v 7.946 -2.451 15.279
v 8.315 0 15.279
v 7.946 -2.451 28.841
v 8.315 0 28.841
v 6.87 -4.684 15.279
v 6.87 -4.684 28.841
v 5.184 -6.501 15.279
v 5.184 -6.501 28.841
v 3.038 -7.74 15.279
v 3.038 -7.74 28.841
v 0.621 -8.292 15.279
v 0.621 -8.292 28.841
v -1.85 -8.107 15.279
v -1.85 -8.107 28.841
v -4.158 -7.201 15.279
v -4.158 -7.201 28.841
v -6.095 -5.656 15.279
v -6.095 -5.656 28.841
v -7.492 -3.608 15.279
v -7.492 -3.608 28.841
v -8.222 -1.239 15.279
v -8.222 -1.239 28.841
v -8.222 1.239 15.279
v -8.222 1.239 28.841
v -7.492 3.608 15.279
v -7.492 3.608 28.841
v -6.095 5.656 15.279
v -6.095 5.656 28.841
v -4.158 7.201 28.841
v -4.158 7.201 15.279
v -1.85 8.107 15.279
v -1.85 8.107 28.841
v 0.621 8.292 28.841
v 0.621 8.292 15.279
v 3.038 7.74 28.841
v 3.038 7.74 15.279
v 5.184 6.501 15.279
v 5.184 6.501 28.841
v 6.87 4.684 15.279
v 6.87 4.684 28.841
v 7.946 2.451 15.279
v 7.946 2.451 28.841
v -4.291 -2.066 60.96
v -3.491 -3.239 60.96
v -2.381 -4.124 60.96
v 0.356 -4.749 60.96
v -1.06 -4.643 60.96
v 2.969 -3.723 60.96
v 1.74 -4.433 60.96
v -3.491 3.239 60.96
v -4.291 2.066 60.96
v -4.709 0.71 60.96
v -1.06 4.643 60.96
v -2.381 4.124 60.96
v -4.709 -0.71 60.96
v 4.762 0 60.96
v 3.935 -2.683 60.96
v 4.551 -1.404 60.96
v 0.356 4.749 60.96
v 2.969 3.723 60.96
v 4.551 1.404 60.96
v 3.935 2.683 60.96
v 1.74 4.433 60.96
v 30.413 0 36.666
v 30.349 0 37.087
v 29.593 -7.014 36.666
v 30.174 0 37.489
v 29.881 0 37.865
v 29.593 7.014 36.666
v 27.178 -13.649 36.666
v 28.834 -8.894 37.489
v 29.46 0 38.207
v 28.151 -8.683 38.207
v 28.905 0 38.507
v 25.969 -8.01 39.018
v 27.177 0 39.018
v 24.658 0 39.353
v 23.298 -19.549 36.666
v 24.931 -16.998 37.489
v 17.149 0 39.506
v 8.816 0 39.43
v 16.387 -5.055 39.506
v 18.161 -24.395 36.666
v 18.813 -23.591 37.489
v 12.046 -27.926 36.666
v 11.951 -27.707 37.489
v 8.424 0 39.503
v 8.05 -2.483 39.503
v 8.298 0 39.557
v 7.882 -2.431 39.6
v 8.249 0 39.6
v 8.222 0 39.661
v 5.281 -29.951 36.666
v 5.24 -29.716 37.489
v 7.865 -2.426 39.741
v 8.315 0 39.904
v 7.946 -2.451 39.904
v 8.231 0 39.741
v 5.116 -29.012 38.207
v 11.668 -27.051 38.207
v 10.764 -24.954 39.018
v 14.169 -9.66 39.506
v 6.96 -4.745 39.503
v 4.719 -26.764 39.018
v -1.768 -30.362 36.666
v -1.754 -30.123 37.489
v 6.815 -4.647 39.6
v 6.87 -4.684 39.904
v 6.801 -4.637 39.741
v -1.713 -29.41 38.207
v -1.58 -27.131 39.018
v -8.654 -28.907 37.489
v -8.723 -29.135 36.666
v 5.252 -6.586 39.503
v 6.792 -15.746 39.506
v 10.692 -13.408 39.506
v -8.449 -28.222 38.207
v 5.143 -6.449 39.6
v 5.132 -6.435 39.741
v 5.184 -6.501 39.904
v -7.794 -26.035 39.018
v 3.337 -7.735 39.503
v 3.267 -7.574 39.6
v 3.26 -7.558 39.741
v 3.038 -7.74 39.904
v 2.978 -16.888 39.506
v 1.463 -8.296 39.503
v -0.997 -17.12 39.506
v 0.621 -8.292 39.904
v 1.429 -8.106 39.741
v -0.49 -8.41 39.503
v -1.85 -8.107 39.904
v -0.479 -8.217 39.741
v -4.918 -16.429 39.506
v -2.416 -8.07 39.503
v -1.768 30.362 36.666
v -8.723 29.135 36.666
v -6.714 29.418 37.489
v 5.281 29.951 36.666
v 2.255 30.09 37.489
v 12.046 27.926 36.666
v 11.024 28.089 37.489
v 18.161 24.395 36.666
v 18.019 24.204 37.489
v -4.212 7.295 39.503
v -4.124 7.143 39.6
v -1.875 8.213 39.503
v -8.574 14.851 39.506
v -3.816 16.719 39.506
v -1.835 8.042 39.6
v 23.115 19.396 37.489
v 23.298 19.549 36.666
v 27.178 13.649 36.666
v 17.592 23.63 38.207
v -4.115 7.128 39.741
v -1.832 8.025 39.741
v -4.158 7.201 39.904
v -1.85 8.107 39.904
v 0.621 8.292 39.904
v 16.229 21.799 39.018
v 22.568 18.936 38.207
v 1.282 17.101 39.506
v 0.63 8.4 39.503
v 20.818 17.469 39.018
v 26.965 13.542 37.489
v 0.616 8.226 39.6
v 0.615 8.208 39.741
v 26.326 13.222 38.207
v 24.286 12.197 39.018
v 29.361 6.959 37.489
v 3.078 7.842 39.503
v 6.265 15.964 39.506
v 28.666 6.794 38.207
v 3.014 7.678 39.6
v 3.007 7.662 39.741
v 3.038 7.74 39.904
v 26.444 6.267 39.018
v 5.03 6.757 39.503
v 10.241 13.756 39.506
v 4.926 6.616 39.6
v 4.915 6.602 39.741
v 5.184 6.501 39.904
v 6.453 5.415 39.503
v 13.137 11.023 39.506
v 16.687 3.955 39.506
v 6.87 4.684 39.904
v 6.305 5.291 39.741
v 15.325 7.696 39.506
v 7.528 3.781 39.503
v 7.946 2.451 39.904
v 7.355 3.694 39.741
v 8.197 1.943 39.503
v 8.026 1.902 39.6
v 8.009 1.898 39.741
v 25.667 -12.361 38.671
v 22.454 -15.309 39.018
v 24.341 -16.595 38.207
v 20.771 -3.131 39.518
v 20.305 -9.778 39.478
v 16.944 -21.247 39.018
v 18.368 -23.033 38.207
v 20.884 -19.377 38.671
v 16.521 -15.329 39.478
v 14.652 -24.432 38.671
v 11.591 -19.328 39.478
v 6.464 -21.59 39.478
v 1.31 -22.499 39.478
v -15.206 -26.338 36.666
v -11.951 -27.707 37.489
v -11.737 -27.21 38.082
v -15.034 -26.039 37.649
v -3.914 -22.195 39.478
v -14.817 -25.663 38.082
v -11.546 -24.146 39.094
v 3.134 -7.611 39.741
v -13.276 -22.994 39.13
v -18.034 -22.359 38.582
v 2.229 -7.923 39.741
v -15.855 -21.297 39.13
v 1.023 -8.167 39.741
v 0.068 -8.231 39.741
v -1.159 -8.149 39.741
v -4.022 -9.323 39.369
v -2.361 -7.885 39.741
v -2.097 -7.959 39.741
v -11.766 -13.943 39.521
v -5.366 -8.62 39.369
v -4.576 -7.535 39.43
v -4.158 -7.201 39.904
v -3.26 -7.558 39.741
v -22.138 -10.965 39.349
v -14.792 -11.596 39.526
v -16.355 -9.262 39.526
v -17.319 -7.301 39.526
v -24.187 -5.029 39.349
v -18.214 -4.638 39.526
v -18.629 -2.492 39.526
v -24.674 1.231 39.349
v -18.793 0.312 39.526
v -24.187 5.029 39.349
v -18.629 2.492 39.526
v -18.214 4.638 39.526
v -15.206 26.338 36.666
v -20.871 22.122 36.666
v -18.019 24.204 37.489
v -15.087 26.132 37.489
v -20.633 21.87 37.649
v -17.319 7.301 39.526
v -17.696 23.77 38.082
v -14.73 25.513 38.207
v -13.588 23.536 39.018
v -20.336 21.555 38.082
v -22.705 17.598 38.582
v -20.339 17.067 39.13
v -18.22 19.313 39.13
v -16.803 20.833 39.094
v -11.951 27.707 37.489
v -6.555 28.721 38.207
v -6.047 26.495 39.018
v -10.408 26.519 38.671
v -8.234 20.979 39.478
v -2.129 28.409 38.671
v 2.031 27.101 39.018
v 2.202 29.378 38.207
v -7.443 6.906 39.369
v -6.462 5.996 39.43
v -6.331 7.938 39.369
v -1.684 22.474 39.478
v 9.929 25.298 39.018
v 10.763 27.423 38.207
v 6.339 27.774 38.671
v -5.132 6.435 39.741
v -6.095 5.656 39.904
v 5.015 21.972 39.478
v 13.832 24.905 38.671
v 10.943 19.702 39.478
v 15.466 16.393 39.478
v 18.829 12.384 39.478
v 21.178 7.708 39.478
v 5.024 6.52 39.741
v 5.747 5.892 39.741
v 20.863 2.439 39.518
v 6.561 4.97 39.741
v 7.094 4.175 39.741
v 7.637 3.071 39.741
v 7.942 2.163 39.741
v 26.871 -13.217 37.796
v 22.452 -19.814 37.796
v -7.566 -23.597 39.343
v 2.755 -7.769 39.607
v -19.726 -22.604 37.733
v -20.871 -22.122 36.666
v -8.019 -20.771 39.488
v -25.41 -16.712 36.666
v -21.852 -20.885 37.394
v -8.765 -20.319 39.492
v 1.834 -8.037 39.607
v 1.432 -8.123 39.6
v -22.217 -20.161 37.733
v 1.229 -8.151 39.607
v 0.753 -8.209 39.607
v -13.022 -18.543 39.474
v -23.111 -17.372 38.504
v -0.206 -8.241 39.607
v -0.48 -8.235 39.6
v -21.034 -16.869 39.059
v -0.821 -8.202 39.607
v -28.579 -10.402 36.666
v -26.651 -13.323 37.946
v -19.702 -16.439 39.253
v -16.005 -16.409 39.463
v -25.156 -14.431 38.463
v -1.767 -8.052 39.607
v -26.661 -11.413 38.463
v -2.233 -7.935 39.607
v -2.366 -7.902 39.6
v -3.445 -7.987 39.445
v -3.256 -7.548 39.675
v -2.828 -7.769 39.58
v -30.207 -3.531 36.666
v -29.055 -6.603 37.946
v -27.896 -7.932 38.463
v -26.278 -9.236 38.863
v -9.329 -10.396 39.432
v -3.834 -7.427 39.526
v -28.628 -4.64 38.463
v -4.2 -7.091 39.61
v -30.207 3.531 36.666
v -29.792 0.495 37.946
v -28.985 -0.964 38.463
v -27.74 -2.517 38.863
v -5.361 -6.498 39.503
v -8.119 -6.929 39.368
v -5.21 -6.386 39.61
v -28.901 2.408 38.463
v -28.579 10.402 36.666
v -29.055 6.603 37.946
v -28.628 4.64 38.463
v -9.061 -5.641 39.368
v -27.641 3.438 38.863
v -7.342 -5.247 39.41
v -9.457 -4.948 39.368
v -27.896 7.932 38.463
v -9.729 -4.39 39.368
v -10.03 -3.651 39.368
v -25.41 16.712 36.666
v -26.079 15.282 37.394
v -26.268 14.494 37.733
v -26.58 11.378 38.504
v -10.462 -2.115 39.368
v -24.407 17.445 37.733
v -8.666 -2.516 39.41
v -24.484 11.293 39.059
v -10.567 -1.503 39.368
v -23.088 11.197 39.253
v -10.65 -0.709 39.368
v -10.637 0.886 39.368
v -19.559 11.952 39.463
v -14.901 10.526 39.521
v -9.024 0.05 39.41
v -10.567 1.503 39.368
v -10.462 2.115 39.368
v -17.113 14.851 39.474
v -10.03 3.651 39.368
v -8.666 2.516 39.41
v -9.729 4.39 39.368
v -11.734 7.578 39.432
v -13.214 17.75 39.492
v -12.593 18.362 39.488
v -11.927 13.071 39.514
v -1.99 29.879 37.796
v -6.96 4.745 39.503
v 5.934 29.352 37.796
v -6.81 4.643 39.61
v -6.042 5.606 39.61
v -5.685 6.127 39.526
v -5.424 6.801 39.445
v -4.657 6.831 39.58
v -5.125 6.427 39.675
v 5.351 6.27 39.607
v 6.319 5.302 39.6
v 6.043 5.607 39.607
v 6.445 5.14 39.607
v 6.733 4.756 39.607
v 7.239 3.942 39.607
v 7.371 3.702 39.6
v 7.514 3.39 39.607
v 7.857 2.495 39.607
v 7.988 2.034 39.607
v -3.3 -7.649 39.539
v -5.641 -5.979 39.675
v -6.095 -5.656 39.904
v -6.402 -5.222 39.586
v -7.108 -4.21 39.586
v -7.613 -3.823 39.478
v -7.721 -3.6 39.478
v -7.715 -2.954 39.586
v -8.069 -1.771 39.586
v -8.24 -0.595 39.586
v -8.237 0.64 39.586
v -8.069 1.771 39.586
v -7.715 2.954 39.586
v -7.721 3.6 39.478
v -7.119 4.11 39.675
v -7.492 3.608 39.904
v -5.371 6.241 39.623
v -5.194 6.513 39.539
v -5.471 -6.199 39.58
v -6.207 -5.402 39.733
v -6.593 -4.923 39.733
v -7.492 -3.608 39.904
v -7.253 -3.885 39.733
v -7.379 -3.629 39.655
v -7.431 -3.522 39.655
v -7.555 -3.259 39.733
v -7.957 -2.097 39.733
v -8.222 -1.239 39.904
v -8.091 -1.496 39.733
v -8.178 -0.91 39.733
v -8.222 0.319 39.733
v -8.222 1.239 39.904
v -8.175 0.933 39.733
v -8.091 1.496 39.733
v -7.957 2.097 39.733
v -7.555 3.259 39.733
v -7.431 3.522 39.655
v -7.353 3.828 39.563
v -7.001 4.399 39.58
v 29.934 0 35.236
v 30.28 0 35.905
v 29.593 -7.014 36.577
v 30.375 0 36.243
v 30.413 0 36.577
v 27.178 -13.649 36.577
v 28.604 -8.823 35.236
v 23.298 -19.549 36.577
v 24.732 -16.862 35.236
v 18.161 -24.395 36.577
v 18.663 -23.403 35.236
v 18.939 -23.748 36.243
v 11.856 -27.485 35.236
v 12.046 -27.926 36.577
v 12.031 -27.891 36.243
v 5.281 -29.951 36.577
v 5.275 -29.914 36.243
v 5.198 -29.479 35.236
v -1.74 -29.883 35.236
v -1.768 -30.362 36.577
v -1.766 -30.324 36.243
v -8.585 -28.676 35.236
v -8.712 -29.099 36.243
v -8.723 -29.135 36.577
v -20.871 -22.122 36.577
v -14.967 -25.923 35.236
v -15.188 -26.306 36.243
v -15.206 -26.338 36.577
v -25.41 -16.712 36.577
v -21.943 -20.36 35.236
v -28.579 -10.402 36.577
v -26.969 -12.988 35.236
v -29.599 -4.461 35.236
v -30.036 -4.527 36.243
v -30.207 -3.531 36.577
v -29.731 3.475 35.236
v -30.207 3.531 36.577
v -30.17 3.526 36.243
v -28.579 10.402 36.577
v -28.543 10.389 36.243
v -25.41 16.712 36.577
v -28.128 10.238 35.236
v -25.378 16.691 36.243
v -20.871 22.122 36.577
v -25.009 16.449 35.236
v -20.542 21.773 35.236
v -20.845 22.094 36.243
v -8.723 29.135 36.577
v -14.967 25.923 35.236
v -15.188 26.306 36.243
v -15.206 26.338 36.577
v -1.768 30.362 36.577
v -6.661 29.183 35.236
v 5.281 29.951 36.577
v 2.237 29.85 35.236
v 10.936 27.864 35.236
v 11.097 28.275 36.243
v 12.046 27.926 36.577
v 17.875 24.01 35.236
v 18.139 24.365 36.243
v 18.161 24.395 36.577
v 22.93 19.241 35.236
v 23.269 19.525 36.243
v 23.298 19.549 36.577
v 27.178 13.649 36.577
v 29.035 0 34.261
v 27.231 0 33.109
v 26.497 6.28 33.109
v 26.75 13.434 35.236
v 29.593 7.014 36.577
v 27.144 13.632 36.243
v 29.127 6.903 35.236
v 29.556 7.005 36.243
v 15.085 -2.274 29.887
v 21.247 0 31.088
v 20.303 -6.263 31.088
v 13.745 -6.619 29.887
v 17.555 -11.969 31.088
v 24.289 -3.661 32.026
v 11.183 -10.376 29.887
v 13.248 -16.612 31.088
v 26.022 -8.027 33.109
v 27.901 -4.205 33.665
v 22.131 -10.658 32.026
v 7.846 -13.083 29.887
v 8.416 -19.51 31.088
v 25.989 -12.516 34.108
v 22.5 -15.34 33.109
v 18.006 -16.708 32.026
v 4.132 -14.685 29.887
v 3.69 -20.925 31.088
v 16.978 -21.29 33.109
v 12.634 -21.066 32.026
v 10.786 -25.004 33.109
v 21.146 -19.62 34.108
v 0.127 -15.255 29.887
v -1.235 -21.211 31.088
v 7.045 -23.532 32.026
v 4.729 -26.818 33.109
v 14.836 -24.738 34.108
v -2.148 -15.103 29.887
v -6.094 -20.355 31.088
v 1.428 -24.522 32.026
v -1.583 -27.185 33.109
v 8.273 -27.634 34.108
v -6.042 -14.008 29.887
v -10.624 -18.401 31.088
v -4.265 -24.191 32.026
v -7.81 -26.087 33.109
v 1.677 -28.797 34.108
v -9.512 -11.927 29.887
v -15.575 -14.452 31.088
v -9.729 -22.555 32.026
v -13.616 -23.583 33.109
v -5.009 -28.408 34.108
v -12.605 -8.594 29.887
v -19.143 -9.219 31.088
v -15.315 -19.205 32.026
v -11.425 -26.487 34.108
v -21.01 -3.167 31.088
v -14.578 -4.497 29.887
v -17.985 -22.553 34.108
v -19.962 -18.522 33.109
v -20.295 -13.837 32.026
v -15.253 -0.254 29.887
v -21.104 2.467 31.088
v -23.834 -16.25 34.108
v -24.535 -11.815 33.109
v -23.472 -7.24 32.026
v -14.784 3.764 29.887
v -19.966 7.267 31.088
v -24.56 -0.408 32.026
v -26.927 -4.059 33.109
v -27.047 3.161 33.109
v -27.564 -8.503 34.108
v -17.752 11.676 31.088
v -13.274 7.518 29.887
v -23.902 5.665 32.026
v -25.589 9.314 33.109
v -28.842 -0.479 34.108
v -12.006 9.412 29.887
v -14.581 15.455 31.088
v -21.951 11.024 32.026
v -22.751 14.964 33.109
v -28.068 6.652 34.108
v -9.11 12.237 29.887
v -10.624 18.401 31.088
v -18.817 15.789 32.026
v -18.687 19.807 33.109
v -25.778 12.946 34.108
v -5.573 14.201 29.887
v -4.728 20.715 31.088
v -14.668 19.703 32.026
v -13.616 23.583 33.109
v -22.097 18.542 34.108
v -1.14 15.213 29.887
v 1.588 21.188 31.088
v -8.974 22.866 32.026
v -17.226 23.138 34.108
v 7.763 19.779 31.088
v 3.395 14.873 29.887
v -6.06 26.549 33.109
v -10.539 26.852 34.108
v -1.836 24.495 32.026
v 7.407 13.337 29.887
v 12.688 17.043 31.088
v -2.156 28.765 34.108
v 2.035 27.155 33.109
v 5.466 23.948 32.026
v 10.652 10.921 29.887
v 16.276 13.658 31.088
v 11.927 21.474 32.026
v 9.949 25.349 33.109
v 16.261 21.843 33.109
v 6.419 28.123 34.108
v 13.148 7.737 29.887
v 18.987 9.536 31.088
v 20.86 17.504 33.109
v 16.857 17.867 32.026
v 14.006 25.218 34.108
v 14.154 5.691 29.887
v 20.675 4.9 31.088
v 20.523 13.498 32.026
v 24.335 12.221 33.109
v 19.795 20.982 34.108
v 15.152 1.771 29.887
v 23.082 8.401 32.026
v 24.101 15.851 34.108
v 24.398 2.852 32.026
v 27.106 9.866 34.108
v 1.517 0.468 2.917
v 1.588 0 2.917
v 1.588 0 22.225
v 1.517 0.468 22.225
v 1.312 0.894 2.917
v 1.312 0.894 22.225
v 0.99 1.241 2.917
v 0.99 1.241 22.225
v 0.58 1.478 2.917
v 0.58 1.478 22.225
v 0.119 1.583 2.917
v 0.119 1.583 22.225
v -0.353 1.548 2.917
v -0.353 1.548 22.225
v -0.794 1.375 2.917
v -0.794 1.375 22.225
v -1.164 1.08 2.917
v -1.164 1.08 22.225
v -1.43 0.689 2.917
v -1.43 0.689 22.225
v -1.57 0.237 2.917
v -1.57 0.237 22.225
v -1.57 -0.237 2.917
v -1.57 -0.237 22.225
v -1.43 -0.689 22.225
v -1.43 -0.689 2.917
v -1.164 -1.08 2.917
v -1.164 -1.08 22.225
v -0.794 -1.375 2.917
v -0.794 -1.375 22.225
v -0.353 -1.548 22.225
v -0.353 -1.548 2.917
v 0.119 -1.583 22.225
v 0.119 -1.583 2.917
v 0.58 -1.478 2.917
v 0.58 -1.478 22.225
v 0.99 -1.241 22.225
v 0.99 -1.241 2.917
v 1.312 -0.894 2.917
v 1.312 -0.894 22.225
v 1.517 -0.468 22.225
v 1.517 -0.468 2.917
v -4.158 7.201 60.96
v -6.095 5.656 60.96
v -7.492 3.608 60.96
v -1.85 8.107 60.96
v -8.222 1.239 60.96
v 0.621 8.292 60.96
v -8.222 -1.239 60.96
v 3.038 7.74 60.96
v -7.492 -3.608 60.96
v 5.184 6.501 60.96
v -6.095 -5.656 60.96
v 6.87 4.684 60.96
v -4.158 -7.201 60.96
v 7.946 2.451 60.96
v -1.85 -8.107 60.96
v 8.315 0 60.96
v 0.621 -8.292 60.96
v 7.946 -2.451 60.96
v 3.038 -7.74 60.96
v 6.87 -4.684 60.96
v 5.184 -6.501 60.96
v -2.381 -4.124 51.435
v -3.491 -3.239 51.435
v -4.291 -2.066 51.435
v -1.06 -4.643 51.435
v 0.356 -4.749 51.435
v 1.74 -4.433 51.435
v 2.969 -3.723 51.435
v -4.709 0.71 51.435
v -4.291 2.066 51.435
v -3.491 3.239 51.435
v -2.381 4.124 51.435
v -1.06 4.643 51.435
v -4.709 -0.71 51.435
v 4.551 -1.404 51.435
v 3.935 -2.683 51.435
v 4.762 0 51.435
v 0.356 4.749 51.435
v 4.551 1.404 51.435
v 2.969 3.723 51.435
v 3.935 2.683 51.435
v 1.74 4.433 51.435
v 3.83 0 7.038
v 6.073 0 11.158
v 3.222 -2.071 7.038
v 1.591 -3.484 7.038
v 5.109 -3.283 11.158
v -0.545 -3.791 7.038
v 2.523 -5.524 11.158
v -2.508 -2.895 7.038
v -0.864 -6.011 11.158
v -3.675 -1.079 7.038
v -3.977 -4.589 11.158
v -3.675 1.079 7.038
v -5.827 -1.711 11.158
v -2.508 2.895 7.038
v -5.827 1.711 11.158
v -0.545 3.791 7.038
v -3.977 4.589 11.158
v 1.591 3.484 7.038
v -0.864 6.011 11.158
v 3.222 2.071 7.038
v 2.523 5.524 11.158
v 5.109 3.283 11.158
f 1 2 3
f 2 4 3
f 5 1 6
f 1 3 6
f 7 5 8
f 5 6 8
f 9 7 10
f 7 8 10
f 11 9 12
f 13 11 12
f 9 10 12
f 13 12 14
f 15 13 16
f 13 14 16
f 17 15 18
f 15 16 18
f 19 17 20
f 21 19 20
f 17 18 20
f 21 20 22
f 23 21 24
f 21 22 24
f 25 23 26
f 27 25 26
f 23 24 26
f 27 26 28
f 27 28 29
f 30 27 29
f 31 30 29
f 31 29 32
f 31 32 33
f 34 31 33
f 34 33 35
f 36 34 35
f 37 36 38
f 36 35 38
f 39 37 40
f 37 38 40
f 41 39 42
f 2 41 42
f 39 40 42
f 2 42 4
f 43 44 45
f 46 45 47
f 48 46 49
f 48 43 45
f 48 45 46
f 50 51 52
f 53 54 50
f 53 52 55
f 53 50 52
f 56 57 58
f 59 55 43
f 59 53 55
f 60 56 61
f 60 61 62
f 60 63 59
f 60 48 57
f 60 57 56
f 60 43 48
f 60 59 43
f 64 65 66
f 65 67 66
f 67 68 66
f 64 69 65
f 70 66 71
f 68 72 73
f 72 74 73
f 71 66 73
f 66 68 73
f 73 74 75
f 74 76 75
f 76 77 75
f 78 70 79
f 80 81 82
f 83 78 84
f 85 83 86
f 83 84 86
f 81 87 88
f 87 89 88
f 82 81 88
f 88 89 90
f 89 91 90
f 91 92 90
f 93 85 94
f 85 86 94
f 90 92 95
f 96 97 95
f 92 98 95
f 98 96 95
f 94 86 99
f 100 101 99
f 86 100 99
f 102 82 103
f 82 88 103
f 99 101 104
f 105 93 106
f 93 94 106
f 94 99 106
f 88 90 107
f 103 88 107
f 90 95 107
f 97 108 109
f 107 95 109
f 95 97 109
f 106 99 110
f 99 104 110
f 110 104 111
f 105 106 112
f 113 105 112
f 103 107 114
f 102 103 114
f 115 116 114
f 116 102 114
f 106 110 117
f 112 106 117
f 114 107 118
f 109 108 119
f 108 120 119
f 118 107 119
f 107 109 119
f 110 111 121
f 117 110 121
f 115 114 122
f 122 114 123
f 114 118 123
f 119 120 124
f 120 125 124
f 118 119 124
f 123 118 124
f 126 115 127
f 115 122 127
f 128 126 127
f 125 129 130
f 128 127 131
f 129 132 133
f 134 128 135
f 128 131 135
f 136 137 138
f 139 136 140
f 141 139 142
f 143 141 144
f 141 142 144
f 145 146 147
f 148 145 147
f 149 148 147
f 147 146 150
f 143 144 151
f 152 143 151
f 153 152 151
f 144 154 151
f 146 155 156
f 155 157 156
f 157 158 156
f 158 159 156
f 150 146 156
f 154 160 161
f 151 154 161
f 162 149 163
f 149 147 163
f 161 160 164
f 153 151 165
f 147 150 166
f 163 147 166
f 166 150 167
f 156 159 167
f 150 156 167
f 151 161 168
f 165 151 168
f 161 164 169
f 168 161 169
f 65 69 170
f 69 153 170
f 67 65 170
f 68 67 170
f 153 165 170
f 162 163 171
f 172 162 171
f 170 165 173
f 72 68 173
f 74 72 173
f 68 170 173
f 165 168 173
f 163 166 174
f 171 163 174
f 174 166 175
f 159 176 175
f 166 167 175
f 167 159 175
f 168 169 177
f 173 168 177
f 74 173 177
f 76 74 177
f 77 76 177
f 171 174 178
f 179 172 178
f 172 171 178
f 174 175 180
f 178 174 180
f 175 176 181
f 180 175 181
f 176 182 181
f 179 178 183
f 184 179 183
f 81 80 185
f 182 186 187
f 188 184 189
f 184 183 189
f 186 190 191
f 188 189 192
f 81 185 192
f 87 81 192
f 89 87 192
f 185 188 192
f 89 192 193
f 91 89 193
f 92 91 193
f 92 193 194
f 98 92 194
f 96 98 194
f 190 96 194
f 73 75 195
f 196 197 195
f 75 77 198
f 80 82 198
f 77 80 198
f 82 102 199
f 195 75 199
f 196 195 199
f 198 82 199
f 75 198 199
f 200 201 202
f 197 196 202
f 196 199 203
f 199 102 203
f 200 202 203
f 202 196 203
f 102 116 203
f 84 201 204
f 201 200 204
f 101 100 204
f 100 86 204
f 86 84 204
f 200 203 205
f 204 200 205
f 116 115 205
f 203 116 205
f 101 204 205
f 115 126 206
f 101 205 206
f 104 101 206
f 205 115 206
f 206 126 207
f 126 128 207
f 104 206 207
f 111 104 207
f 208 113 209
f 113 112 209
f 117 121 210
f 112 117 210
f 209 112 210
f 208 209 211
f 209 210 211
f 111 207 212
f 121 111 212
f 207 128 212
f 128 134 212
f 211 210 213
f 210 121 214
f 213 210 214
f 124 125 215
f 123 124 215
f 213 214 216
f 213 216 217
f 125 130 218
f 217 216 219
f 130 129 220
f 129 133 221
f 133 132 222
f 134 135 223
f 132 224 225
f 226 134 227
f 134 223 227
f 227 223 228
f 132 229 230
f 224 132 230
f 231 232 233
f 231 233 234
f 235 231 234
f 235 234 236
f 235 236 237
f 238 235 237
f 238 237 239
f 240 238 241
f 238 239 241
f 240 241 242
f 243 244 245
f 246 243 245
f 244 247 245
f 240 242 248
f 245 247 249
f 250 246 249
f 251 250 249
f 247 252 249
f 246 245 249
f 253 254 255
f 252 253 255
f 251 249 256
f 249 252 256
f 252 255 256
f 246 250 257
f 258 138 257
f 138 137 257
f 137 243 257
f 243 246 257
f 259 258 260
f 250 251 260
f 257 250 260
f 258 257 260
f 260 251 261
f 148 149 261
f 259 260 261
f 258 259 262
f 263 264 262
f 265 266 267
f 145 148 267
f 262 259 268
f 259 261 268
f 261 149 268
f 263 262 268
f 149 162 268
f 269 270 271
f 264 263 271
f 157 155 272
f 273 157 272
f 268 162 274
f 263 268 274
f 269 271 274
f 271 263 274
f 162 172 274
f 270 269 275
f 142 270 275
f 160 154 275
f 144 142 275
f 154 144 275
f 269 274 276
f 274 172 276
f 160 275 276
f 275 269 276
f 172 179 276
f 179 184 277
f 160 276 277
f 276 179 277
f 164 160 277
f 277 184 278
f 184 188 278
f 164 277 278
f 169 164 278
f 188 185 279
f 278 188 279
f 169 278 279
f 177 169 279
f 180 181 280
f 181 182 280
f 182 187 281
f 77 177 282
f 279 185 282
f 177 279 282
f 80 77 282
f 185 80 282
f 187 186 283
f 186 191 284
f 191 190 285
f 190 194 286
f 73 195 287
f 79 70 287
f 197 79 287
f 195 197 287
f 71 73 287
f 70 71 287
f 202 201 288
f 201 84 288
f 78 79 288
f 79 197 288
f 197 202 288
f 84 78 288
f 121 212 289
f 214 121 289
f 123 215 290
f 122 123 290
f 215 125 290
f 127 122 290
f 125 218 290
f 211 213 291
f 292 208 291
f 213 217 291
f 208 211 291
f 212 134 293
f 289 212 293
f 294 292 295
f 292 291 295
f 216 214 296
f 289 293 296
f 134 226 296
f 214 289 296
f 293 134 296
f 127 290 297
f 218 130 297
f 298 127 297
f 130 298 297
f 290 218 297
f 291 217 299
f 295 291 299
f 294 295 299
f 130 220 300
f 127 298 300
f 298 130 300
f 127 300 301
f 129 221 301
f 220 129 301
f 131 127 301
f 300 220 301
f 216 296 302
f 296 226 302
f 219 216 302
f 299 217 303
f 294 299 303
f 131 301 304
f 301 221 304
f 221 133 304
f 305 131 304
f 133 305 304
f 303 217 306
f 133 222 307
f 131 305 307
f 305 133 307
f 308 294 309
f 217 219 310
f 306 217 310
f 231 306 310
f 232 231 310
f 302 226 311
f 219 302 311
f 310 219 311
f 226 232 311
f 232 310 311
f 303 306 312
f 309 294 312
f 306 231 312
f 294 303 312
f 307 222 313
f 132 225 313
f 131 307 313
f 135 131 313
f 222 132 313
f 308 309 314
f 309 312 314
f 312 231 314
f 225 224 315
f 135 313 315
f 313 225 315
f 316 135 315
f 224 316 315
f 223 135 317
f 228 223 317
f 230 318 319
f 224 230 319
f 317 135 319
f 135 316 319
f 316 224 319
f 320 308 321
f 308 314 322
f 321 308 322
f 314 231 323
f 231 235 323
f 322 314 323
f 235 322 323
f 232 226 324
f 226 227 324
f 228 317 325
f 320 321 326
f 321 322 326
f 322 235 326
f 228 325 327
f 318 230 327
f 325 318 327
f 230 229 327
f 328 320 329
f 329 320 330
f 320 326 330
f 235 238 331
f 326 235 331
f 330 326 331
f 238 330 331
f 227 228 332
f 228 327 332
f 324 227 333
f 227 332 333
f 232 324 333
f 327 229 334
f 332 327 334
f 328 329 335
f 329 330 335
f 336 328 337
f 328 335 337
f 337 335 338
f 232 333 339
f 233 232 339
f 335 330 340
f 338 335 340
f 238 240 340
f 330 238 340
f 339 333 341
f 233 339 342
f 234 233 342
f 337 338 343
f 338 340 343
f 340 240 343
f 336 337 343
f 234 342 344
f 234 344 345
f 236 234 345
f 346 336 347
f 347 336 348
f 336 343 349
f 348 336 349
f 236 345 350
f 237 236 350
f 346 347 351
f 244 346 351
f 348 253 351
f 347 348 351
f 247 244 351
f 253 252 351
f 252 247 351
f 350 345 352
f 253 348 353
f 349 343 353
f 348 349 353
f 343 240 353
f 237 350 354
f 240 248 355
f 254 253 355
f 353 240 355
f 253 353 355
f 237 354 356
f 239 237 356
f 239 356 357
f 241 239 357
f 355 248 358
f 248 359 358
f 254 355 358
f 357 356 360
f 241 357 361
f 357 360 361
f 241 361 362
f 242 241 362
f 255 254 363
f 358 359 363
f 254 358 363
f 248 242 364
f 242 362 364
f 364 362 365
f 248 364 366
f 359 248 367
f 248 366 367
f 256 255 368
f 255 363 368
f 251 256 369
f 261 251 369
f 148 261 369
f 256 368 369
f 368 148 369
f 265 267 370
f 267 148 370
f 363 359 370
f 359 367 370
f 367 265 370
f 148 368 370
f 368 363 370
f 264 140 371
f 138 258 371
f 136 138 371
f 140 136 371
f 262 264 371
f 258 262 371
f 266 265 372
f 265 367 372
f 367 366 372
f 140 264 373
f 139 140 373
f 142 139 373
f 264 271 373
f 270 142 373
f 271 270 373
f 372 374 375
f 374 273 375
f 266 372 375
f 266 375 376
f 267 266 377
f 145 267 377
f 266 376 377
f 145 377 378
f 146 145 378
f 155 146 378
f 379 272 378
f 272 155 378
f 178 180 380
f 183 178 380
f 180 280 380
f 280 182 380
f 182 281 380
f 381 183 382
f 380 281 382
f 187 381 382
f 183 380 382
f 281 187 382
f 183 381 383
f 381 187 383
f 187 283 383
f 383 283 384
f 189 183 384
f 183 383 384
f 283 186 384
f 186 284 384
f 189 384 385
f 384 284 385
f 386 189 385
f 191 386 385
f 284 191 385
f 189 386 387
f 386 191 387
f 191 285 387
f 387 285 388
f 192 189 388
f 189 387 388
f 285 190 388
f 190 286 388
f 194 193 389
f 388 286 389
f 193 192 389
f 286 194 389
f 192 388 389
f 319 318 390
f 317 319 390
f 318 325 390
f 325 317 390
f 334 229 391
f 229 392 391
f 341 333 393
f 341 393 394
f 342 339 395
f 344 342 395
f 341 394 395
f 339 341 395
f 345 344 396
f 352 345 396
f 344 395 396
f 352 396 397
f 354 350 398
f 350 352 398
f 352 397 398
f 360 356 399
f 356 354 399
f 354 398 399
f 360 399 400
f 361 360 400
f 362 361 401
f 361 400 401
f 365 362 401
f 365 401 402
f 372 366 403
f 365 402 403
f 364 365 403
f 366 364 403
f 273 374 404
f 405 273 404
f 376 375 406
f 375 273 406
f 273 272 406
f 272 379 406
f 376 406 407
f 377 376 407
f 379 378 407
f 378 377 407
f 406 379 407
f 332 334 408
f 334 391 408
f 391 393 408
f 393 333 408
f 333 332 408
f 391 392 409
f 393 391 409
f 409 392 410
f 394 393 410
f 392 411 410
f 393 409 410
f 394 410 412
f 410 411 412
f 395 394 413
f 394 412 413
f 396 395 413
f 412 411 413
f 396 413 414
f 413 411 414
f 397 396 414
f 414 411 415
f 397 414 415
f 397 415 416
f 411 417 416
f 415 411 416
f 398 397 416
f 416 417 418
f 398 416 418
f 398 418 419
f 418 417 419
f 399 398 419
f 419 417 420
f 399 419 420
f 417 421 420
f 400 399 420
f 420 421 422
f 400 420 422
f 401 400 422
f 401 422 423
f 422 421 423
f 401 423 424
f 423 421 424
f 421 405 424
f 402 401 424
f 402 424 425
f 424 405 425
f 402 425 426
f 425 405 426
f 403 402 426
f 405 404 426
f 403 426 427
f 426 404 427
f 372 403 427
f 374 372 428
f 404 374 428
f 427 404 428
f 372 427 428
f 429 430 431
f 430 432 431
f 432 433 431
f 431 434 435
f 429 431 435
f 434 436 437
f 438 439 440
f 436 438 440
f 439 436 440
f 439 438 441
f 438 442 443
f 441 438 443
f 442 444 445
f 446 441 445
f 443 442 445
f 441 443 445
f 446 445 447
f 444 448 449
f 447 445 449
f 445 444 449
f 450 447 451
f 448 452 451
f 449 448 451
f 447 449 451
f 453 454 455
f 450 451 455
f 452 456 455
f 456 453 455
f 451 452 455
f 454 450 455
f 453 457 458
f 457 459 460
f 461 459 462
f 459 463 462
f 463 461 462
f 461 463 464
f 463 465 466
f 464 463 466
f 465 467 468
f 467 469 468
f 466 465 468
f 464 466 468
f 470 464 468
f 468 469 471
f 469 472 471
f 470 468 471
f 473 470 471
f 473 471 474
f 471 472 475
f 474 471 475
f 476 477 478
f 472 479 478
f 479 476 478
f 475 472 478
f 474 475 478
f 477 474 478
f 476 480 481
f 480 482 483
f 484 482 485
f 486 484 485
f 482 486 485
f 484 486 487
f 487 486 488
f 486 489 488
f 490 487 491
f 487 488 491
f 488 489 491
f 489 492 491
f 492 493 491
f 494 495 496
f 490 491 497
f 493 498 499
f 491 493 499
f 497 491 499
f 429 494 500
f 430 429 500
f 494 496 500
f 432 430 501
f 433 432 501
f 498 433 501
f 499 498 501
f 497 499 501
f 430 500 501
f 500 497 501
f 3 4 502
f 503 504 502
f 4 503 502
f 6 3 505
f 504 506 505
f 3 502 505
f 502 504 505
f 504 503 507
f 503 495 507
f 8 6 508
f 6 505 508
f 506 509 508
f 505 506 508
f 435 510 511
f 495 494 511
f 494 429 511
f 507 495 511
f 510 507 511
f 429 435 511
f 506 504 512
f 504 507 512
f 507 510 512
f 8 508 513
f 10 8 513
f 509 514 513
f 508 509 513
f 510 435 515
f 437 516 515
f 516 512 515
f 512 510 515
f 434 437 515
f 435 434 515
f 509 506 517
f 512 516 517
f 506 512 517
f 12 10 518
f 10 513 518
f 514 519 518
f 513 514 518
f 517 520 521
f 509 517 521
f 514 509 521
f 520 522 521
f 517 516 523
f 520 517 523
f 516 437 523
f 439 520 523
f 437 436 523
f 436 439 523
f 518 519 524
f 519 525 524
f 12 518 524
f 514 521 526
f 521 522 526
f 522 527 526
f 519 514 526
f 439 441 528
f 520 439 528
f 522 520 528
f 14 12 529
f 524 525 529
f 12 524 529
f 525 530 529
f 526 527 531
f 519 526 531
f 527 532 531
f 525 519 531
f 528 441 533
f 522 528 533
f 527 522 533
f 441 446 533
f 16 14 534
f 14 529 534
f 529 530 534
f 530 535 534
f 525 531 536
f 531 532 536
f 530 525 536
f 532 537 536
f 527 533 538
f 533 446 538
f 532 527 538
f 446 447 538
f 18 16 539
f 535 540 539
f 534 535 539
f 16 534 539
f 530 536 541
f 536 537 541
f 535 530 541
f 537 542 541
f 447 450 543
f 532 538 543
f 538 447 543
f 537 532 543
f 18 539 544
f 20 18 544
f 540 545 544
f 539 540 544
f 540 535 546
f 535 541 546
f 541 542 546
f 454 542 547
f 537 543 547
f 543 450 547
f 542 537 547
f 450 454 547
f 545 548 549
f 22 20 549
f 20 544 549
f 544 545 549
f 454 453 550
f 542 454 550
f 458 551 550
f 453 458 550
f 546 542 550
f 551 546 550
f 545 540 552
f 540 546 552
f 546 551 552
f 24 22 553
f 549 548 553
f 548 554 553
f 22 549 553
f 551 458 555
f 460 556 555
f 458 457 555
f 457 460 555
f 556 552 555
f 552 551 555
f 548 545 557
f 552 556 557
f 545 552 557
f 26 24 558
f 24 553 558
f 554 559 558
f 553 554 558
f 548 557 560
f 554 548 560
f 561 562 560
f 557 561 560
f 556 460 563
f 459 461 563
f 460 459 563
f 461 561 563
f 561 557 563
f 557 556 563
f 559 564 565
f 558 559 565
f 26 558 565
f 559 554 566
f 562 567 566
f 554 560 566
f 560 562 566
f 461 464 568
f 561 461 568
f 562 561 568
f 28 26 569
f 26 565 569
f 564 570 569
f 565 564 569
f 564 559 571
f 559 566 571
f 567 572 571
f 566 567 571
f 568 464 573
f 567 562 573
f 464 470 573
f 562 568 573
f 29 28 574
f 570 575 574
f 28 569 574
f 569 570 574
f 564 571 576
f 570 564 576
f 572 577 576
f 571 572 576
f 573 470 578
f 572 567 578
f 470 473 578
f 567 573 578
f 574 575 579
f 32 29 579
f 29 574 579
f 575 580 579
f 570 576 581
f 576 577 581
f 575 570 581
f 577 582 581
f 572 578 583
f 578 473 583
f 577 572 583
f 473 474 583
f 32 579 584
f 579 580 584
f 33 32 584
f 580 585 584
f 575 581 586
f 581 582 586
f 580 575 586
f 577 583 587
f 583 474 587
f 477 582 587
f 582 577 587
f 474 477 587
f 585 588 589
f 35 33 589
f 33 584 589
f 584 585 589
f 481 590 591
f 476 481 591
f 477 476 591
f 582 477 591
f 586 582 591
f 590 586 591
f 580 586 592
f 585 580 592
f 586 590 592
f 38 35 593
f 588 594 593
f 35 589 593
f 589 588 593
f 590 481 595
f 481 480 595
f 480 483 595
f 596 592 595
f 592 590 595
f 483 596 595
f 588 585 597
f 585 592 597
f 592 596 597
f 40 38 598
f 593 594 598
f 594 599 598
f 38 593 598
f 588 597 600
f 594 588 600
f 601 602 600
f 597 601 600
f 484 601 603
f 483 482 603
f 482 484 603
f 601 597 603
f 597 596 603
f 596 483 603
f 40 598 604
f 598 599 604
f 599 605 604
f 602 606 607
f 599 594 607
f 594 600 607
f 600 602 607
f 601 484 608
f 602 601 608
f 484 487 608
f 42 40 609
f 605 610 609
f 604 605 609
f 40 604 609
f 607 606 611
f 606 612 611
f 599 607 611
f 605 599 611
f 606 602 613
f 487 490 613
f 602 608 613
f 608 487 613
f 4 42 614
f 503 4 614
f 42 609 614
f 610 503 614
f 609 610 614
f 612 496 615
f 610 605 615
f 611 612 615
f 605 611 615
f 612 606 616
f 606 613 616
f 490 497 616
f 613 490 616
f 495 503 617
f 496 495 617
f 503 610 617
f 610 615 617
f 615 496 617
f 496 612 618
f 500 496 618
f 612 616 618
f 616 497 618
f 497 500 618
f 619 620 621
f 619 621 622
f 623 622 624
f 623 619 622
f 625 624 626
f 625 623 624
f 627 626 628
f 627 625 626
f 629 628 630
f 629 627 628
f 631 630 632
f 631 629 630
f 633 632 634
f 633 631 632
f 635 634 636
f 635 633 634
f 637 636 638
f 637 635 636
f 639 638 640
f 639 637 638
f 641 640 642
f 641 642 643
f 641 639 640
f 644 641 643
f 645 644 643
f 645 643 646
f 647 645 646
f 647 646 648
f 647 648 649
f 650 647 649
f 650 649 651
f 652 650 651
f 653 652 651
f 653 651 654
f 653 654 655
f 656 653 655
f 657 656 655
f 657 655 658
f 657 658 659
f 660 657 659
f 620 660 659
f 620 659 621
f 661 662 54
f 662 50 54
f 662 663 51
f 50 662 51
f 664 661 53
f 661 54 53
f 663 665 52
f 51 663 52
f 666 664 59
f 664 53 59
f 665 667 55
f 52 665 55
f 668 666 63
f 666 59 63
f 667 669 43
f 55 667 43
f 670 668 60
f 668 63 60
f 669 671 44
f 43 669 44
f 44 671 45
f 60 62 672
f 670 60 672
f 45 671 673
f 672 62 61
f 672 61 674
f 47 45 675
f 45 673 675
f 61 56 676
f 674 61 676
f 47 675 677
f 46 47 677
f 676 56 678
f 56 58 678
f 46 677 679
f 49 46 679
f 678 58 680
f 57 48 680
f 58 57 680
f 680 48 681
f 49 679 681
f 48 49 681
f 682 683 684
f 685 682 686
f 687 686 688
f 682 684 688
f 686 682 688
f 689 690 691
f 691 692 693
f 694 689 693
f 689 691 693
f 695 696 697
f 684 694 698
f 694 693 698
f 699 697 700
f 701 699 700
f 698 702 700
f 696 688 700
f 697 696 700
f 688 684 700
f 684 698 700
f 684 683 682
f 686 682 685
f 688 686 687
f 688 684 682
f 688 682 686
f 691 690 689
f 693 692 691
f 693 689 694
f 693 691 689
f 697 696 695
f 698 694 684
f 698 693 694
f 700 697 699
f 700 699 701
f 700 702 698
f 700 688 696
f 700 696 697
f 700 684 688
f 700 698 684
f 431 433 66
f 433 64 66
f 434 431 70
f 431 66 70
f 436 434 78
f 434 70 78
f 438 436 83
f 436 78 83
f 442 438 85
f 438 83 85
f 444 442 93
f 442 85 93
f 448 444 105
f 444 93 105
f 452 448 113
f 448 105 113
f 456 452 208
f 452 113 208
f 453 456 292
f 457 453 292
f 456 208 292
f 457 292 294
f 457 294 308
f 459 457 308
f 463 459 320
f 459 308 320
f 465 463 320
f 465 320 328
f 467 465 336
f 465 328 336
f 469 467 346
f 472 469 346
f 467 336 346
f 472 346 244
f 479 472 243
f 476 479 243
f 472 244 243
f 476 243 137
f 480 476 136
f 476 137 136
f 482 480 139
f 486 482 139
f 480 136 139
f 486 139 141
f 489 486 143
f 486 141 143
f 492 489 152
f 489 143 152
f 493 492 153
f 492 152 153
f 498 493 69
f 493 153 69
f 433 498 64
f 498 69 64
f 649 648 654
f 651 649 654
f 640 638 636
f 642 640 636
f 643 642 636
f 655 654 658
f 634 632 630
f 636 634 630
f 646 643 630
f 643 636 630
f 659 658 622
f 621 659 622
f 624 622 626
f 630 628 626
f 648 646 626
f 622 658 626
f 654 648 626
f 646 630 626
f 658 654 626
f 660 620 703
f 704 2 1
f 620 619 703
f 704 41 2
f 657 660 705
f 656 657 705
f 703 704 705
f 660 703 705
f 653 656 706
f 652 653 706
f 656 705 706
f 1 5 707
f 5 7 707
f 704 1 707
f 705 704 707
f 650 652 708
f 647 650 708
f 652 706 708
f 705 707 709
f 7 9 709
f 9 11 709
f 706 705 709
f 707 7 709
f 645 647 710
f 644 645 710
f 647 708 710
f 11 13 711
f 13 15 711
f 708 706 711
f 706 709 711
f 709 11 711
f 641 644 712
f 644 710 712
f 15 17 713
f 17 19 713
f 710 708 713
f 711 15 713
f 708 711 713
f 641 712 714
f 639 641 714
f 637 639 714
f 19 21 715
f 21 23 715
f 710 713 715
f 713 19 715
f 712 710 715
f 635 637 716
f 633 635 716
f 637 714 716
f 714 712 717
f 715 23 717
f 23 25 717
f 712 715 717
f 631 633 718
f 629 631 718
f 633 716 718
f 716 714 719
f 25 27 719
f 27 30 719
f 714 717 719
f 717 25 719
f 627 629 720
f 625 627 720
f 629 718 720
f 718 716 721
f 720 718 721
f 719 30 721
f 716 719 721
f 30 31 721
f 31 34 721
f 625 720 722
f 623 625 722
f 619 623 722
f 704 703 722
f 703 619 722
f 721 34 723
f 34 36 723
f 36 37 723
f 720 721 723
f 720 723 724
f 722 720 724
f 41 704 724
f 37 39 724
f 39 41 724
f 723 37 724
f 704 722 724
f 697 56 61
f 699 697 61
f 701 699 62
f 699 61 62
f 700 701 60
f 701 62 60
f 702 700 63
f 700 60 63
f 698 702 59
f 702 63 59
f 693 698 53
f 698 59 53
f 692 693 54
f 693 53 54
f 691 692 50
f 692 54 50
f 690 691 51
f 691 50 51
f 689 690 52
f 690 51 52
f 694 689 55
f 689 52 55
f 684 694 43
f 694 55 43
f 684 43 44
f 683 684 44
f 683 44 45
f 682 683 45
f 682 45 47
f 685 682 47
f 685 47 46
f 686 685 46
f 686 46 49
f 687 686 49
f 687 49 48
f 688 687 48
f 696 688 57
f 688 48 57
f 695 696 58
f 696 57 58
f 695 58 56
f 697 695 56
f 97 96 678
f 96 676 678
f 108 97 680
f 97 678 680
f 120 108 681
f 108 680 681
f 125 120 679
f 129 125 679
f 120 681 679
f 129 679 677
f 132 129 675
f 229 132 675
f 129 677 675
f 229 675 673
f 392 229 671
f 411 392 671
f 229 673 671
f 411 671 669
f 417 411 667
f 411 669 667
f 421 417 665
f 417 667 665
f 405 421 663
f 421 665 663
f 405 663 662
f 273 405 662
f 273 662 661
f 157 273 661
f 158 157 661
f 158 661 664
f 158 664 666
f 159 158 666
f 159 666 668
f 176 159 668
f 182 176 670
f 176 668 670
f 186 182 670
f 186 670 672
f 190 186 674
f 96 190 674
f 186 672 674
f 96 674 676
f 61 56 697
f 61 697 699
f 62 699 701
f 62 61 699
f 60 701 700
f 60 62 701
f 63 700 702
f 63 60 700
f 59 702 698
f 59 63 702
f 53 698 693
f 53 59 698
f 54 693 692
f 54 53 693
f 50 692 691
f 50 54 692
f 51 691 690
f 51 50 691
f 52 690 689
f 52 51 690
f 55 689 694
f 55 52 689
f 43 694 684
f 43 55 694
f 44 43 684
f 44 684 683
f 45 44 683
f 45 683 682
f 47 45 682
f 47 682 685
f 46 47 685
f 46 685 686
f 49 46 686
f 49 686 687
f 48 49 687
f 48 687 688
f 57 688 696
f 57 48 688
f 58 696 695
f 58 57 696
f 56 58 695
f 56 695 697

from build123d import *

# Parameters (mm, degrees)
F2_R     = 4.7625
F3_DEPTH = 9.525
F4_DEPTH = 9.525
F5_R     = 1.5875
F6_DEPTH = 22.225


with BuildPart() as f1:
    # F0 (on Front) → F1 (revolve)
    with BuildSketch(Plane.XZ):
        with BuildLine():
            Line((0, 60.96), (0, 0))
            Line((0, 0), (8.315011056, 15.2790336204))
            Line((8.315011056, 15.2790336204), (8.315011056, 28.840571844))
            add(Edge.make_bspline(
                [(8.315011056, 28.840571844), (18.6914253173, 30.2652374729), (28.6020671273, 32.1181749891), (30.3993781488, 36.022545001), (30.4129573538, 36.577154624)],
                knots=[0, 0, 0, 0, 0.4005706761, 0.4704761927, 0.4704761927, 0.4704761927, 0.4704761927], degree=3))
            Line((30.4129573538, 36.577154624), (30.4129573538, 36.6655998046))
            add(Edge.make_bspline(
                [(30.4129573538, 36.6655998046), (30.3956767058, 37.3640475603), (28.0882131696, 40.8609150587), (7.5651257895, 38.6523696291), (8.2304579039, 39.7658310786), (8.315011056, 39.9039330631)],
                knots=[0.4742017901, 0.4742017901, 0.4742017901, 0.4742017901, 0.5627034759, 0.9492294083, 1, 1, 1, 1], degree=3))
            Line((8.315011056, 39.9039330631), (8.315011056, 60.96))
            Line((8.315011056, 60.96), (0, 60.96))
        make_face()
    revolve(axis=Axis((0, 0, 30.48), (0, 0, -1)))

    # F2 (on face) → F3 (cut)
    with BuildSketch(Plane.XY.offset(60.96)):
        Circle(F2_R)
    extrude(amount=-F3_DEPTH, mode=Mode.SUBTRACT)

    # F5 (on Top) → F6 (cut)
    with BuildSketch(Plane.XY):
        Circle(F5_R)
    extrude(amount=F6_DEPTH, mode=Mode.SUBTRACT)


with BuildPart() as f4:
    # F2 (on face) → F4 (new body)
    with BuildSketch(Plane.XY.offset(60.96)):
        Circle(F2_R)
    extrude(amount=-F4_DEPTH)


solid = Compound([f1.part, f4.part])
